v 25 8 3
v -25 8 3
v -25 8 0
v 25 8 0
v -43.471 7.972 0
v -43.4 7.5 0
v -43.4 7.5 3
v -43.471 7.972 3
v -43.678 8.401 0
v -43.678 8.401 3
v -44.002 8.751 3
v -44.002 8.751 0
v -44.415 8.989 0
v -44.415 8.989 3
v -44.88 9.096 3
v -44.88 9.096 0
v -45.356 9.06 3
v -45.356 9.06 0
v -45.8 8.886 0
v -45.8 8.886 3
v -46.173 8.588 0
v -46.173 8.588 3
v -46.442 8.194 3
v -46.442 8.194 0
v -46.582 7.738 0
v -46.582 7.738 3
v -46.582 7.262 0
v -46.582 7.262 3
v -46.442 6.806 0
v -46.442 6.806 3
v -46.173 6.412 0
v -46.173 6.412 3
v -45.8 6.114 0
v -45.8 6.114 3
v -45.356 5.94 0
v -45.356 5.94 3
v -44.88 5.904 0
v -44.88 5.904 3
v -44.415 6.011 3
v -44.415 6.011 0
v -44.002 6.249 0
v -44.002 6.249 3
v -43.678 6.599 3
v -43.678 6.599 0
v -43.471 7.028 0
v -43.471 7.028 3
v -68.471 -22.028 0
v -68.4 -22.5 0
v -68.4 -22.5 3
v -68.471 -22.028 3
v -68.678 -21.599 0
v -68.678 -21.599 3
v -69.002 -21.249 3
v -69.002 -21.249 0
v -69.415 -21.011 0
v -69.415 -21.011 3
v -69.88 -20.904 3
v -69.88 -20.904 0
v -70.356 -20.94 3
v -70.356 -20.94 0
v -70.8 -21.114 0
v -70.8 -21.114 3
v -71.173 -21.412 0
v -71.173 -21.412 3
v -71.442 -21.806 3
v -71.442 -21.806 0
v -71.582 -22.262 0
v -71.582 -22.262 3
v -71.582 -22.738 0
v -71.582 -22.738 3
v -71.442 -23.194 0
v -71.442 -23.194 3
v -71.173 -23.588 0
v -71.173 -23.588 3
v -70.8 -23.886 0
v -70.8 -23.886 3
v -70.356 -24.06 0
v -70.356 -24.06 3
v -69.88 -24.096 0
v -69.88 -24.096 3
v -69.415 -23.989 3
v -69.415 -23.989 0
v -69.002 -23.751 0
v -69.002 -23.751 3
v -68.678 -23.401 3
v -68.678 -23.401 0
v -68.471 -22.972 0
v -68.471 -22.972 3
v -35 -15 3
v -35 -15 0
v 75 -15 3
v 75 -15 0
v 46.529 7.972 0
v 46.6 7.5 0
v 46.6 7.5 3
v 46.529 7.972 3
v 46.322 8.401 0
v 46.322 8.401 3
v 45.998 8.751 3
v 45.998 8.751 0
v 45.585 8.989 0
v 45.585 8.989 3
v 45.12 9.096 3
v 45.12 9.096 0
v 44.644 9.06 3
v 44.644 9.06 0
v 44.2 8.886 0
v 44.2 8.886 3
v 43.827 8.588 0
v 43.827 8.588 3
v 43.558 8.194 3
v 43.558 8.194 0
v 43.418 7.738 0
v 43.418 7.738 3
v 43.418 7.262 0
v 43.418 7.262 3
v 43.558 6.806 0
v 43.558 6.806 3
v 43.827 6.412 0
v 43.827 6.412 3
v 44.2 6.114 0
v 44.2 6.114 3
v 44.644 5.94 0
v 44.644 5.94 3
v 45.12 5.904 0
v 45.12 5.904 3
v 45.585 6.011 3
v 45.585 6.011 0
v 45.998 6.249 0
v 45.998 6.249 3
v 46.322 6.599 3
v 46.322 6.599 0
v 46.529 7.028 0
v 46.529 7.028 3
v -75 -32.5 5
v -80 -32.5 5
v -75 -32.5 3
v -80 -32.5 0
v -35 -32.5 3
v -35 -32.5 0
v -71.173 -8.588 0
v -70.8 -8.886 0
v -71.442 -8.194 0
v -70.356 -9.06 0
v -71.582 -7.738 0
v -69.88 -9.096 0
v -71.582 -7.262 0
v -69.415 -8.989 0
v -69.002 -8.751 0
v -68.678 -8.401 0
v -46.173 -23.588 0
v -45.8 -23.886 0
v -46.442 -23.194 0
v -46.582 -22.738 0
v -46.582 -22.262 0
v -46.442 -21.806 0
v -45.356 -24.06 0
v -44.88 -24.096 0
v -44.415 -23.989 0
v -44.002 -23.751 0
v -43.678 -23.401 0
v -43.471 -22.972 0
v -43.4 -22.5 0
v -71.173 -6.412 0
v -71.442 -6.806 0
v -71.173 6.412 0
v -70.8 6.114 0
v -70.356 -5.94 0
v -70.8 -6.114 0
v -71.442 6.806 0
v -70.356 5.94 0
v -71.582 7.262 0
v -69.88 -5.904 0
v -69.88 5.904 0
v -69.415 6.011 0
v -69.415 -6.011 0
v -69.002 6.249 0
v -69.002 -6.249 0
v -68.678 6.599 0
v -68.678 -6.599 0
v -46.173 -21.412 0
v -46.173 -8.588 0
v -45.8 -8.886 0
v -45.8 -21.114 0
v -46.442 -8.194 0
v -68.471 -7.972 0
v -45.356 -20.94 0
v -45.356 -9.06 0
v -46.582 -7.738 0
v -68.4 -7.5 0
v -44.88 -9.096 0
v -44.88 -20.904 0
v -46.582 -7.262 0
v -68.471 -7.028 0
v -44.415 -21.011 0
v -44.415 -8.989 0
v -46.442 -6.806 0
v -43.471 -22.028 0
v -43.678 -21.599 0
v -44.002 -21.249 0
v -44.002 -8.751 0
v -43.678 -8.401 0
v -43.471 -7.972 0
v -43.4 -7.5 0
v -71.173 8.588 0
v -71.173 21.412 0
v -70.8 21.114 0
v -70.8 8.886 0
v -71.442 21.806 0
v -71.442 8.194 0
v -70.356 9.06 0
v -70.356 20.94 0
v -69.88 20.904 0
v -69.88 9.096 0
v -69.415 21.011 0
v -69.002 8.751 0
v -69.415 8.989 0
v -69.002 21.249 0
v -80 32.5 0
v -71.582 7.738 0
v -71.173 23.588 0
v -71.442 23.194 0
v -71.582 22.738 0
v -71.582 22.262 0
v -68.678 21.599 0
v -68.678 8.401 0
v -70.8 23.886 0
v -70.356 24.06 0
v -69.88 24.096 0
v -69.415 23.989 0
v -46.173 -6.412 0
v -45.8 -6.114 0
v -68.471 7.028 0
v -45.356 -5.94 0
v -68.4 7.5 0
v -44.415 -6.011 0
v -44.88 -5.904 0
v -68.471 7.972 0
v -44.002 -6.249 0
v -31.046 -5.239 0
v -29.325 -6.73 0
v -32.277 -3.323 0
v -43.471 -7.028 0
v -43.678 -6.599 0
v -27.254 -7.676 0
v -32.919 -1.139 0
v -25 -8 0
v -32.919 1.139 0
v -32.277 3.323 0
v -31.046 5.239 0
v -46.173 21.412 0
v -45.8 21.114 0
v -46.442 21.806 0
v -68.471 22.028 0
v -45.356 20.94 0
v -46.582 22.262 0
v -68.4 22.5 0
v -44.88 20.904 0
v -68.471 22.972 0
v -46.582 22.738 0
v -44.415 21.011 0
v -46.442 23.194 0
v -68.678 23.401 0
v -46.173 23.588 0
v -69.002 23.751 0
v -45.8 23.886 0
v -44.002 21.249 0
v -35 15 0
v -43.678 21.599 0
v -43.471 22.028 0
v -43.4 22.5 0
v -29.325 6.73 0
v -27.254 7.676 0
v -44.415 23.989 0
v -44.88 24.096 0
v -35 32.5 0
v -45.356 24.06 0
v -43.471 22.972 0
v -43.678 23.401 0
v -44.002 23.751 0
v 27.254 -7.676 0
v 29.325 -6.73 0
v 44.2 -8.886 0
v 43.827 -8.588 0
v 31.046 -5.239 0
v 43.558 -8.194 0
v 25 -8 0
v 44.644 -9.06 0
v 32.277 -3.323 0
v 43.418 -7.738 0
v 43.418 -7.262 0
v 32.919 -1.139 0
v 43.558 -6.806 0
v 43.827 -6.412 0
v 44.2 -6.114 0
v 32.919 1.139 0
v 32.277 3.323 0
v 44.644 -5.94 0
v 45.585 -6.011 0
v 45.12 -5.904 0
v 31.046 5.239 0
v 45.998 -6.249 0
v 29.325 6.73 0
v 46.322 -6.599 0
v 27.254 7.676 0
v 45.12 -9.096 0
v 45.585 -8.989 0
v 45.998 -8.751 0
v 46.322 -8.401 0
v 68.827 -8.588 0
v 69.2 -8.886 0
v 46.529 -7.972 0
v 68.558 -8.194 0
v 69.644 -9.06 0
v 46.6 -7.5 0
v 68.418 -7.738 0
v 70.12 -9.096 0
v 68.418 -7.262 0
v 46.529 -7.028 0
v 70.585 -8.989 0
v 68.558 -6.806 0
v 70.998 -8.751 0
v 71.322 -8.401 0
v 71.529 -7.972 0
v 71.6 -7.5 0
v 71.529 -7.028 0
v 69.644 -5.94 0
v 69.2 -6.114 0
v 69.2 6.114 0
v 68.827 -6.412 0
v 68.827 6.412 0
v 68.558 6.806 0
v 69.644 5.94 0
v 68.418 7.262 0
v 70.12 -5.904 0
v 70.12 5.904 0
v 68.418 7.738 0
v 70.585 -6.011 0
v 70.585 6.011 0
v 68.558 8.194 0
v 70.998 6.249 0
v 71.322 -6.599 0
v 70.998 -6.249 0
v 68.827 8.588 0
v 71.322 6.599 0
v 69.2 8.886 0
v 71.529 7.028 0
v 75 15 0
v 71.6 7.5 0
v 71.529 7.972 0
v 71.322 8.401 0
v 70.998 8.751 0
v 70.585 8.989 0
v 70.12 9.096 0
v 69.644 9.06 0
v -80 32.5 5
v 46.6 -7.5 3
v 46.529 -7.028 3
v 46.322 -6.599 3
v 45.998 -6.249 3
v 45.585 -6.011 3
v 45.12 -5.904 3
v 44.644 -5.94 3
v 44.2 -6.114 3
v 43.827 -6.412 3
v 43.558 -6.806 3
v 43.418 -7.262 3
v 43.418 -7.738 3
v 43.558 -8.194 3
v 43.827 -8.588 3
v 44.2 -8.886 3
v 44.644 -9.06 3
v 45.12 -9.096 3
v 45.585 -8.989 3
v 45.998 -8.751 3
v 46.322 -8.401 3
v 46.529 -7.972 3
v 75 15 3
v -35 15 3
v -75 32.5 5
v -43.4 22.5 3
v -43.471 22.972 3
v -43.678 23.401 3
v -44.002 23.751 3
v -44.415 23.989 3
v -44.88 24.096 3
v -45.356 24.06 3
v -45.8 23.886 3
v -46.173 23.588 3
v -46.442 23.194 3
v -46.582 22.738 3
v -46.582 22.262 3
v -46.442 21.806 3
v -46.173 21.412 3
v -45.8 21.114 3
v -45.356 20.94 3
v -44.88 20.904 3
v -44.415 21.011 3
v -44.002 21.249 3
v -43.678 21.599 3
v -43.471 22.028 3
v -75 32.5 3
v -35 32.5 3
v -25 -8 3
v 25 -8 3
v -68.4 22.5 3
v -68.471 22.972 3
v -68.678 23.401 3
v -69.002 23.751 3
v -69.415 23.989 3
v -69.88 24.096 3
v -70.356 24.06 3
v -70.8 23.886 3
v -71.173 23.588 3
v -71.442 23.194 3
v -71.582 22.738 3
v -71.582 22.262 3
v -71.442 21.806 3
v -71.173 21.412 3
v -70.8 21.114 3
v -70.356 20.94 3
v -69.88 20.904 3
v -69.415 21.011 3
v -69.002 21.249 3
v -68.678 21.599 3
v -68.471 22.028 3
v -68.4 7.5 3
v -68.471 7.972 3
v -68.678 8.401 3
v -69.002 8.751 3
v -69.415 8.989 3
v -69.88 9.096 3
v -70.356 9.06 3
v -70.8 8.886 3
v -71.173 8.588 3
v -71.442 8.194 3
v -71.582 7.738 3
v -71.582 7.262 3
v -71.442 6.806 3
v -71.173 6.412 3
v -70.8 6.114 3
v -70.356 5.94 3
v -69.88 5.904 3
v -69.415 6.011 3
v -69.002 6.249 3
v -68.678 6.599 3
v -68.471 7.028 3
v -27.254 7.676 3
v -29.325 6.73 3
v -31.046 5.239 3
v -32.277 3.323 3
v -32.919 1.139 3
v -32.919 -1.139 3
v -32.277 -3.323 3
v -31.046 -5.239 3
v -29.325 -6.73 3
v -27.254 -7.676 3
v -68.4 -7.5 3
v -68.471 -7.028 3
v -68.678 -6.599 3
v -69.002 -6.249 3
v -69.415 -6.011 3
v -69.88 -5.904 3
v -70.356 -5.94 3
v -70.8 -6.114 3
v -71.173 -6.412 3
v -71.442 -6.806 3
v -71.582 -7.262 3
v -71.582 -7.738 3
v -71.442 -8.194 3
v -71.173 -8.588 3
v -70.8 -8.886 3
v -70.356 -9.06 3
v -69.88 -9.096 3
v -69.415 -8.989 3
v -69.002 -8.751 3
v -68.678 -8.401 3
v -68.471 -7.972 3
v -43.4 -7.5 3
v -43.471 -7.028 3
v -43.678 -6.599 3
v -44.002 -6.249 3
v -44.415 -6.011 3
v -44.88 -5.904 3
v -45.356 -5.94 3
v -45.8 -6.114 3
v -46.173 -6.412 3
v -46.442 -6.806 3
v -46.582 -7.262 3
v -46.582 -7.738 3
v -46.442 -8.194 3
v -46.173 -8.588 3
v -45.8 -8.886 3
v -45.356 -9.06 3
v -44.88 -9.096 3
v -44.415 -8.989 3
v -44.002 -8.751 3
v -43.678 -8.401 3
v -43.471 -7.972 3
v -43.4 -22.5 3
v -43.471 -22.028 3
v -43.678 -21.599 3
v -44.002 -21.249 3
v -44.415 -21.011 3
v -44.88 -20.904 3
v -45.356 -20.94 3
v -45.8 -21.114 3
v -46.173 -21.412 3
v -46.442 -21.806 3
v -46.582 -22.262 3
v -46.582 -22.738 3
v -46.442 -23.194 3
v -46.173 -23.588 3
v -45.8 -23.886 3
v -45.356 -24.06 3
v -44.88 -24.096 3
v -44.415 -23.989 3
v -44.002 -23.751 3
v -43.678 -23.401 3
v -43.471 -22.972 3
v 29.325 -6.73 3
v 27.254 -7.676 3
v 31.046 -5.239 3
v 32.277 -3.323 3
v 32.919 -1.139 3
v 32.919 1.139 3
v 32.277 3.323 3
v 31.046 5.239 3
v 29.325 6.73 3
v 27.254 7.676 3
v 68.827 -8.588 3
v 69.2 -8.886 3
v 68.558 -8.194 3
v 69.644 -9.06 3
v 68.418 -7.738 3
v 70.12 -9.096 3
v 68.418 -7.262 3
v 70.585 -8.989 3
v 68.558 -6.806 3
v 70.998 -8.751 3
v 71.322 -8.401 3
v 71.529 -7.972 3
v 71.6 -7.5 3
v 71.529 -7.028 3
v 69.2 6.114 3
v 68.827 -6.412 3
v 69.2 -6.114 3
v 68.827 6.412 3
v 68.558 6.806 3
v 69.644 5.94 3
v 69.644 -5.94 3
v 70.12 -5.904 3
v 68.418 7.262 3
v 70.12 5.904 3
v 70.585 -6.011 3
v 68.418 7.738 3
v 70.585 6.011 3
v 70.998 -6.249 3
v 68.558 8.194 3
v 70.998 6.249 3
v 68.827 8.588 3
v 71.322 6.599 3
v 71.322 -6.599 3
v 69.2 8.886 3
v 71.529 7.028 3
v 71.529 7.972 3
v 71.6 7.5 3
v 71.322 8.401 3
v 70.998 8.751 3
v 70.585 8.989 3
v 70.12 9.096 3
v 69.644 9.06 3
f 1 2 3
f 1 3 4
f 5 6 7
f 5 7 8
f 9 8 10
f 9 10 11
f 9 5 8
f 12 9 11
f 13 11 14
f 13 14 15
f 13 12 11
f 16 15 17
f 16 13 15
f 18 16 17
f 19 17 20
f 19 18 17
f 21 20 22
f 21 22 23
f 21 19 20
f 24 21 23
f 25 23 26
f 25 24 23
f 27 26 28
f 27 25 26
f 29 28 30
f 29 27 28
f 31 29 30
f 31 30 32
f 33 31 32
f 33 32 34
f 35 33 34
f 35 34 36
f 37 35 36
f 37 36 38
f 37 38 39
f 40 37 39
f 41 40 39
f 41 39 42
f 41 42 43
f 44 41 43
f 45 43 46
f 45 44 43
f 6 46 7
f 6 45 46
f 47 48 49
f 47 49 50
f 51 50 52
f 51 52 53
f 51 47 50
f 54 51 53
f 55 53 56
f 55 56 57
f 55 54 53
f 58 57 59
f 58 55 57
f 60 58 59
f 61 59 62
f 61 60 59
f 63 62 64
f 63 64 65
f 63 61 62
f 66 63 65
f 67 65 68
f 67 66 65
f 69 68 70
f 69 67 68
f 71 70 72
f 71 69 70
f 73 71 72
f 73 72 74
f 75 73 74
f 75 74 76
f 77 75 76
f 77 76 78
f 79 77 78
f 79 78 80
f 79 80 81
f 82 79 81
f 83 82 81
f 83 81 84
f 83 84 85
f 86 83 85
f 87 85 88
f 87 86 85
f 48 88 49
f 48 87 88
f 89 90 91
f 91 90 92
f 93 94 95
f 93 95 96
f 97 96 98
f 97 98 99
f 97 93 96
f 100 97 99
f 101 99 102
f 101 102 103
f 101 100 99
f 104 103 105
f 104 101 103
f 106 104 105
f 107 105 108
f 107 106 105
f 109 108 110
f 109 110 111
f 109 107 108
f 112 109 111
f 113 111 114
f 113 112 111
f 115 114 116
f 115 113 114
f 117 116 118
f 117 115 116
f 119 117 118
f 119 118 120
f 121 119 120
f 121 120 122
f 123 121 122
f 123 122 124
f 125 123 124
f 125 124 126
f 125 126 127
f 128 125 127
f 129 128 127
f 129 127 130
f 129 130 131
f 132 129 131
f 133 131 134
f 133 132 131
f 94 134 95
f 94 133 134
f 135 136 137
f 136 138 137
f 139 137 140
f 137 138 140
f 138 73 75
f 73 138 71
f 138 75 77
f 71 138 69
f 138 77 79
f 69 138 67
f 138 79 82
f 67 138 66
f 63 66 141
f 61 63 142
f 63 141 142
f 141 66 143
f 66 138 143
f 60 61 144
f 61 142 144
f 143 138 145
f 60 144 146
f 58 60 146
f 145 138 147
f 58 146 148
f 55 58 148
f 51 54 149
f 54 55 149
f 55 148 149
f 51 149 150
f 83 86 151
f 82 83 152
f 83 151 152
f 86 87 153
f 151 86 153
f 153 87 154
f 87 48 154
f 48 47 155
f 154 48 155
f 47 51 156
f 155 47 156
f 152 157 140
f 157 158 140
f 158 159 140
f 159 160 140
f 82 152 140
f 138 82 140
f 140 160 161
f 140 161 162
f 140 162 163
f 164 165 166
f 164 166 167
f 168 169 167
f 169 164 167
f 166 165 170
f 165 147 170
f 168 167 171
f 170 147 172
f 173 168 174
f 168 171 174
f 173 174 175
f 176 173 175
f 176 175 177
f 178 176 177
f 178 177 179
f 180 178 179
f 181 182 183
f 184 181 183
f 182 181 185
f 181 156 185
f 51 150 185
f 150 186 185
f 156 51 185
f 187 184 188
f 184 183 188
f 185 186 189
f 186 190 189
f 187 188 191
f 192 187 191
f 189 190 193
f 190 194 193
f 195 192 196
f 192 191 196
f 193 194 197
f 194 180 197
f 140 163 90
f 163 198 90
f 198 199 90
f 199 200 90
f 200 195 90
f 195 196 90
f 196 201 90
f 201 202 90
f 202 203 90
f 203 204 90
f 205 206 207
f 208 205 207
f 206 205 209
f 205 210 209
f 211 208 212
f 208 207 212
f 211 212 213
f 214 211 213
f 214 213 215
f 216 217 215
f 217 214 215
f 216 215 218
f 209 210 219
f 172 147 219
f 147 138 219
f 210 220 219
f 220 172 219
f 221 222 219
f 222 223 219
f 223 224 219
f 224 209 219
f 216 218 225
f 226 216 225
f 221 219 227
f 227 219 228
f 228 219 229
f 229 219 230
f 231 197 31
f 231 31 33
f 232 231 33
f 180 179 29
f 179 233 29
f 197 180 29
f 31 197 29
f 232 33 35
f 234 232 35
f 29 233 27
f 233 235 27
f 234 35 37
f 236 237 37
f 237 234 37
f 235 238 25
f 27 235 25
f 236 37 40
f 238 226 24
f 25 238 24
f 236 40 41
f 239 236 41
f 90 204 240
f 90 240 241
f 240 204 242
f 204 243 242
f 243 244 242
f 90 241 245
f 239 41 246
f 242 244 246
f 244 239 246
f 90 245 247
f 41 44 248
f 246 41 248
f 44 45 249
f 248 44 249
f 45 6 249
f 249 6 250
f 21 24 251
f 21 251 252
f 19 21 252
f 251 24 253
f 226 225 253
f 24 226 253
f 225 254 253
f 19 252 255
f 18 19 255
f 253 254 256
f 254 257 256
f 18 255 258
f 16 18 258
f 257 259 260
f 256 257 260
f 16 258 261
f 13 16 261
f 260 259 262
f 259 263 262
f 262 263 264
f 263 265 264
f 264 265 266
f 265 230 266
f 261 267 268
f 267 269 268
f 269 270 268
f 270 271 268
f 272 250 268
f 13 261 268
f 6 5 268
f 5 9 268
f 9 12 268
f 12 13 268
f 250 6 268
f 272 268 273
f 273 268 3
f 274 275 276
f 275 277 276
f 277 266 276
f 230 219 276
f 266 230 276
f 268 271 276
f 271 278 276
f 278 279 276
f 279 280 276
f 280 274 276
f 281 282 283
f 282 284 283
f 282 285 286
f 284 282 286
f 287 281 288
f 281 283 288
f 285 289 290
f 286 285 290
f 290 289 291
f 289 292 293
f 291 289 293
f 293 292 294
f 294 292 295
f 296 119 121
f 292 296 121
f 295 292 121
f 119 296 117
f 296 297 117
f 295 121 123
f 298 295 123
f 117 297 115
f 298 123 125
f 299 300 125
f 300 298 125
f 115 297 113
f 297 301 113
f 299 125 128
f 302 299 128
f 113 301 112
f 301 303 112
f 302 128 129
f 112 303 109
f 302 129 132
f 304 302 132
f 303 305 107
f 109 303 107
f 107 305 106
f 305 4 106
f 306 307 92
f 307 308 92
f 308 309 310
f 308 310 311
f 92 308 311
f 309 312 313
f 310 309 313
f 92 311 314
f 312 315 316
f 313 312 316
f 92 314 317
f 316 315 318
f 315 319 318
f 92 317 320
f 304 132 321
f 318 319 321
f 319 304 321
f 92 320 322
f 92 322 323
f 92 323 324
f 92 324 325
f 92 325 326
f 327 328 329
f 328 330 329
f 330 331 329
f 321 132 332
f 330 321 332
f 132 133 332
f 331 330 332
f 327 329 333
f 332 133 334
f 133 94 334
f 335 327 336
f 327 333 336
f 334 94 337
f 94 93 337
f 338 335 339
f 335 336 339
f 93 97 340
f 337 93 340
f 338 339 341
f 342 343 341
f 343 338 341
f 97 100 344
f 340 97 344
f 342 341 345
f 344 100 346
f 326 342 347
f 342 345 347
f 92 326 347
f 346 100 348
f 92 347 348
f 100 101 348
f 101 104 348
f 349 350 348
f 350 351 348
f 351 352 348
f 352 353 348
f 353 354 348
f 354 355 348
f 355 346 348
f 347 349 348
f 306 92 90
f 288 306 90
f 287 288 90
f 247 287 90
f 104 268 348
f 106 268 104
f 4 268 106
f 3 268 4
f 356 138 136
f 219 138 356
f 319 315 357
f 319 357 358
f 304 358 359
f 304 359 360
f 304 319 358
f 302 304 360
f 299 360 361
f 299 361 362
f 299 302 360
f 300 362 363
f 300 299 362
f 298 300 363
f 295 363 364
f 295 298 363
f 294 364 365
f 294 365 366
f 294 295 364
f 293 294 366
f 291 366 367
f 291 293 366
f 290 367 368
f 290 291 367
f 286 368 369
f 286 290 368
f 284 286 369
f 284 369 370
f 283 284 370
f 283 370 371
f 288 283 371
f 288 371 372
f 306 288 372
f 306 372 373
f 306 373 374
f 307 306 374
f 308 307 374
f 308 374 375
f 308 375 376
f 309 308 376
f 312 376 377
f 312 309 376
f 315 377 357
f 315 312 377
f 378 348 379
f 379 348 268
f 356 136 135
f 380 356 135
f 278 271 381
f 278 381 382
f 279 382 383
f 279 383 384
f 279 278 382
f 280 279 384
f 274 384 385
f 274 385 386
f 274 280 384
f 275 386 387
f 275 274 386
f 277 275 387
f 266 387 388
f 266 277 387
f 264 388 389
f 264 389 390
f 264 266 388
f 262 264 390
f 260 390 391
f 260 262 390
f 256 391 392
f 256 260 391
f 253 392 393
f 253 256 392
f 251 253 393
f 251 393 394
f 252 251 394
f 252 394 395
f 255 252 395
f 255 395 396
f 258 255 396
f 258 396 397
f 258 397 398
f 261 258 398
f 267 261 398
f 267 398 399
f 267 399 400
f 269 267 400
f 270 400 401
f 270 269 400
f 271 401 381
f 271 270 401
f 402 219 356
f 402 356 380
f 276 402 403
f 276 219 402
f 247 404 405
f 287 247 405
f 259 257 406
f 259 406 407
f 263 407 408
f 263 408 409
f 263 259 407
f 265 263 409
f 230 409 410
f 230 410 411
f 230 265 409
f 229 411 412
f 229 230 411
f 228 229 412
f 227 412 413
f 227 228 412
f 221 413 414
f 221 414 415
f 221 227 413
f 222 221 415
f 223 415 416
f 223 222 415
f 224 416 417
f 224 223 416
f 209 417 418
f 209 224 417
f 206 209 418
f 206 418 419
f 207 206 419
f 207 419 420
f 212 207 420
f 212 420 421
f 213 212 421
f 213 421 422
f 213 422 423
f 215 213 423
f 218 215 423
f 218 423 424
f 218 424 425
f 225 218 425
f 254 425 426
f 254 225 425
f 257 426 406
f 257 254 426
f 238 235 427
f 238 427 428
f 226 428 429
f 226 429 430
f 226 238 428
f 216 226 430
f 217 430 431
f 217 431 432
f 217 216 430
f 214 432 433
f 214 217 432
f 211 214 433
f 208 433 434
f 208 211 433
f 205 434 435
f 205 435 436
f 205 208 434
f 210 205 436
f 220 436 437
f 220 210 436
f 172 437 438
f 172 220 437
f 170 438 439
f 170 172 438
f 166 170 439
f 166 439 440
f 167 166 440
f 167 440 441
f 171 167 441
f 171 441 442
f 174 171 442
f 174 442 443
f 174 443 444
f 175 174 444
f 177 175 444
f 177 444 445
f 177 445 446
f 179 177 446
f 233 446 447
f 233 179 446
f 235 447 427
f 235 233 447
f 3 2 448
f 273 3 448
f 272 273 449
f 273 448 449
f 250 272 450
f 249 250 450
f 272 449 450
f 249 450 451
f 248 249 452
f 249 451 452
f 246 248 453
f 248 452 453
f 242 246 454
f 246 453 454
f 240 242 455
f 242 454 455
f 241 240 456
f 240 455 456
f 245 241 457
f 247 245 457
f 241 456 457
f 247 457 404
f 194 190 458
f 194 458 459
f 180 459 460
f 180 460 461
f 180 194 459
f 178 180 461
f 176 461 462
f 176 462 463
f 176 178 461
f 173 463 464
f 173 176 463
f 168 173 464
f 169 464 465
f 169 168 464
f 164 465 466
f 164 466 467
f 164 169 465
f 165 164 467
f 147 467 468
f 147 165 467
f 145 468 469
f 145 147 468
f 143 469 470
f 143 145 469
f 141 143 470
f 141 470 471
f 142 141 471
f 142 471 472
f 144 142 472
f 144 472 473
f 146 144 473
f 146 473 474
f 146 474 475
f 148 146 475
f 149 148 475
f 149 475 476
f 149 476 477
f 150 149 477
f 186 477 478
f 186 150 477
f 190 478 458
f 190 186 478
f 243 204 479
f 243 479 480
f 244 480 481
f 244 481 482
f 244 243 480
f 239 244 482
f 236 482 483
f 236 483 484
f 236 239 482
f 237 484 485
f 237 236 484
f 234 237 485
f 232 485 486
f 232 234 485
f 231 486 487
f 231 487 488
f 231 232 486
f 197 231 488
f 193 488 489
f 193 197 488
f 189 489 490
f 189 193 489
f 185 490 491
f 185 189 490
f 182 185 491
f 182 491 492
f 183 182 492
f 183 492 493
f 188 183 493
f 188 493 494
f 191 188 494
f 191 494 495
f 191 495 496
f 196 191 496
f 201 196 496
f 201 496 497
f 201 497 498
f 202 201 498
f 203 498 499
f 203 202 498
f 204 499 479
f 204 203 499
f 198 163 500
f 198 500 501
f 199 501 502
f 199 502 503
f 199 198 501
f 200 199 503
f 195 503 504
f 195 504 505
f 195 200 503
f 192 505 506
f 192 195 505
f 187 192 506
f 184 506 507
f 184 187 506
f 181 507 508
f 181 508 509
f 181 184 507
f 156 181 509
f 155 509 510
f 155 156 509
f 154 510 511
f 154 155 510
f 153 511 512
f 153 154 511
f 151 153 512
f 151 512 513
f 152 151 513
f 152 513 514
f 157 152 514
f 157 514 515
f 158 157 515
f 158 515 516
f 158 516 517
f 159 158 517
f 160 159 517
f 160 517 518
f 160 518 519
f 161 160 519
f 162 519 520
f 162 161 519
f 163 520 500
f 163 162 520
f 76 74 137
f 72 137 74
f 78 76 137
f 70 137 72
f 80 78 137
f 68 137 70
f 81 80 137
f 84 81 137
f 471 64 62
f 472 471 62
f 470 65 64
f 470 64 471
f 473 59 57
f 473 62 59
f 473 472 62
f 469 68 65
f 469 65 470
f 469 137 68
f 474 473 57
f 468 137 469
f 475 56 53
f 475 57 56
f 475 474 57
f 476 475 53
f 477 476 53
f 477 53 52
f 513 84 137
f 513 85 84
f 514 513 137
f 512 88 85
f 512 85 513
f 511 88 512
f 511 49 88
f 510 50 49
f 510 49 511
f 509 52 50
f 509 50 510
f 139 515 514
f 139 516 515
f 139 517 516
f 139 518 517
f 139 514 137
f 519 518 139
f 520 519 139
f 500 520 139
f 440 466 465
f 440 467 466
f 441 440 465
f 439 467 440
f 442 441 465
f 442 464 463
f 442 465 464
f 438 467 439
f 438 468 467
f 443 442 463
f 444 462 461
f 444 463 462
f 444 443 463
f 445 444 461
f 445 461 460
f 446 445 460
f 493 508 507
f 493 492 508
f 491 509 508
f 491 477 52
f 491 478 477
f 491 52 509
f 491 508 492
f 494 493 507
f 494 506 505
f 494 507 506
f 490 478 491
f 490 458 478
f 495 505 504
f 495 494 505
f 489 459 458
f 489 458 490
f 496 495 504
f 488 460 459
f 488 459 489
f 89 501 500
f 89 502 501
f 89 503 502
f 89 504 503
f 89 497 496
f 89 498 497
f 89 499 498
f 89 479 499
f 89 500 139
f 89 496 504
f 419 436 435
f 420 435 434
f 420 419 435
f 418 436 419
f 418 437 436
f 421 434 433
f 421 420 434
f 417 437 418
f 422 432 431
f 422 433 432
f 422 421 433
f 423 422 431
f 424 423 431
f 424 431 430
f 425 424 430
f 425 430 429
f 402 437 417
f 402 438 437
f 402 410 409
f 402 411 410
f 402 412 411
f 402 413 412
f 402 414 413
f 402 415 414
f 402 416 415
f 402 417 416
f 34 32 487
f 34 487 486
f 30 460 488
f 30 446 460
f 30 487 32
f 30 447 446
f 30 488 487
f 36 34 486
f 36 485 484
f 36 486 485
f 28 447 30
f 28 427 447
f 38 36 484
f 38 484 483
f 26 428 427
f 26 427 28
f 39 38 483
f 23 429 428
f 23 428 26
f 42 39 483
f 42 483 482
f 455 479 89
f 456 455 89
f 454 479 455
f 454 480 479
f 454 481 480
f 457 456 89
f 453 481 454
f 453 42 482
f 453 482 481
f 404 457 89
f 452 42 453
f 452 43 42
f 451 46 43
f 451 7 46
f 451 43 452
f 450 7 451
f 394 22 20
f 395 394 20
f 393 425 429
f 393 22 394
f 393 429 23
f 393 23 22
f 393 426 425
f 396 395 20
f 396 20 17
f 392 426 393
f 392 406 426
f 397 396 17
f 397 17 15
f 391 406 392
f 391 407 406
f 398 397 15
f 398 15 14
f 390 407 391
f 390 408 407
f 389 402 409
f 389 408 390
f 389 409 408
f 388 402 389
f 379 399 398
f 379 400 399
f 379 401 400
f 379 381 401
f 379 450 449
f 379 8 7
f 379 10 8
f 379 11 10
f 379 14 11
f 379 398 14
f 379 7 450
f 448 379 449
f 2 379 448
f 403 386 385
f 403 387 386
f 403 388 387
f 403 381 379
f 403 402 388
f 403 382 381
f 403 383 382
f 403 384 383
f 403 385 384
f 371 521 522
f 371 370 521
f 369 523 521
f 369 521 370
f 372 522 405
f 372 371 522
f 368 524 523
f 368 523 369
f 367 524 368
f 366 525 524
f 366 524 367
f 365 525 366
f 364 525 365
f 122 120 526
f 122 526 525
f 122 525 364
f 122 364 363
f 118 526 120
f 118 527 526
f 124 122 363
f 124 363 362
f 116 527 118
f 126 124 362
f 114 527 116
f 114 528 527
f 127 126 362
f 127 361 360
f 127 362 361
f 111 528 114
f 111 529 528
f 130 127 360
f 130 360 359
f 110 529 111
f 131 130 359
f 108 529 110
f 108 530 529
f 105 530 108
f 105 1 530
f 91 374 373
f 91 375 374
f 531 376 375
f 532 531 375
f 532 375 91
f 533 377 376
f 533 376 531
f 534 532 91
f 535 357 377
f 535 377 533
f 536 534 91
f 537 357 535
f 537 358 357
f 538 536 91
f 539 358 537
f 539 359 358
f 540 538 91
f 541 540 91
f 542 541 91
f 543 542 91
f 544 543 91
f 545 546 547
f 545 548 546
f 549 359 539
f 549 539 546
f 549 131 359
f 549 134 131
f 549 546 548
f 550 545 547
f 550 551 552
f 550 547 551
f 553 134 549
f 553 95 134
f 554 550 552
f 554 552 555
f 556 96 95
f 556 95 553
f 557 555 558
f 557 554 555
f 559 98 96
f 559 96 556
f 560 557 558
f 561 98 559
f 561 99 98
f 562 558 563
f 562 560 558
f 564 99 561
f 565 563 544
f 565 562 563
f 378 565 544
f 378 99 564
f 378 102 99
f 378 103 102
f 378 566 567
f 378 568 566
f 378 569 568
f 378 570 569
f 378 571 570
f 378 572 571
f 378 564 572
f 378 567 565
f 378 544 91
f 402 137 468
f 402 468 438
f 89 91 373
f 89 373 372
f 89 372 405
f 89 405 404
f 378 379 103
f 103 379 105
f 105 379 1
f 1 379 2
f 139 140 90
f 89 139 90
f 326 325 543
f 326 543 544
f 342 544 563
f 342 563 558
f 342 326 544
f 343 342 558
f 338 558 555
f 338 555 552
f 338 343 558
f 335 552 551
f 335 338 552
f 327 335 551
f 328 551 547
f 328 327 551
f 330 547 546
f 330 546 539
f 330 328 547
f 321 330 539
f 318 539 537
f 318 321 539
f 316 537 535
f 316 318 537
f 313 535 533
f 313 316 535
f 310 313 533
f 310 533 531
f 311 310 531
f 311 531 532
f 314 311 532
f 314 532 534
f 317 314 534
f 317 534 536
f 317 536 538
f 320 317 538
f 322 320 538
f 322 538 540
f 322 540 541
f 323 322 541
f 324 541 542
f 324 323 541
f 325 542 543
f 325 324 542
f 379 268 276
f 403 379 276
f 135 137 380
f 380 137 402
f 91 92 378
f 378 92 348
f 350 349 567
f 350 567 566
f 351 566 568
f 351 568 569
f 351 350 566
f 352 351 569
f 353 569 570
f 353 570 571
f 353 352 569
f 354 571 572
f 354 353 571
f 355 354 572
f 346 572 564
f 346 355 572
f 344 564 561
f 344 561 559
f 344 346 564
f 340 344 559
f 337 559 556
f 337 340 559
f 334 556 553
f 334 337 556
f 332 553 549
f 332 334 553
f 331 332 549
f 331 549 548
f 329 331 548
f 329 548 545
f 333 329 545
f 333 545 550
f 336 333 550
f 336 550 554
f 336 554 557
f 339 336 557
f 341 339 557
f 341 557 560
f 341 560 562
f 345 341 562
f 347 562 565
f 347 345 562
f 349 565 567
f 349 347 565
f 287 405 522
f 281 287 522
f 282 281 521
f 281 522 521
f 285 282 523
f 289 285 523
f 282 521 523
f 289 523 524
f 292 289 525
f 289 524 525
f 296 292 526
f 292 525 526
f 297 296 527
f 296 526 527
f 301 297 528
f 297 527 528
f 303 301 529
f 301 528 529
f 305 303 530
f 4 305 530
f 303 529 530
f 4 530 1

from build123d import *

# Parameters (mm, degrees)
SKETCH_R     = 1.6
PAD_DEPTH    = 3
SKETCH001_W  = 5
SKETCH001_H  = 65
PAD001_DEPTH = 2
POCKET_DEPTH = 5


with BuildPart() as part:
    # Sketch → Pad (new body)
    with BuildSketch(Plane.XY):
        Polygon((-80, 32.5), (-80, -32.5), (-35, -32.5), (-35, -15), (75, -15), (75, 15), (-35, 15), (-35, 32.5), align=None)
        with Locations((-70, 22.5)):
            Circle(SKETCH_R, mode=Mode.SUBTRACT)
        with Locations((-45, 22.5)):
            Circle(SKETCH_R, mode=Mode.SUBTRACT)
        with Locations((-70, 7.5)):
            Circle(SKETCH_R, mode=Mode.SUBTRACT)
        with Locations((-45, 7.5)):
            Circle(SKETCH_R, mode=Mode.SUBTRACT)
        with Locations((-70, -7.5)):
            Circle(SKETCH_R, mode=Mode.SUBTRACT)
        with Locations((-45, -7.5)):
            Circle(SKETCH_R, mode=Mode.SUBTRACT)
        with Locations((-70, -22.5)):
            Circle(SKETCH_R, mode=Mode.SUBTRACT)
        with Locations((-45, -22.5)):
            Circle(SKETCH_R, mode=Mode.SUBTRACT)
        with Locations((45, 7.5)):
            Circle(SKETCH_R, mode=Mode.SUBTRACT)
        with Locations((45, -7.5)):
            Circle(SKETCH_R, mode=Mode.SUBTRACT)
        with Locations((70, 7.5)):
            Circle(SKETCH_R, mode=Mode.SUBTRACT)
        with Locations((70, -7.5)):
            Circle(SKETCH_R, mode=Mode.SUBTRACT)
    extrude(amount=PAD_DEPTH)

    # Sketch001 → Pad001 (new body)
    with BuildSketch(Plane.XY.offset(3)):
        with Locations((-77.5, 0)):
            Rectangle(SKETCH001_W, SKETCH001_H)
    extrude(amount=PAD001_DEPTH)

    # Sketch002 → Pocket (cut)
    with BuildSketch(Plane.XY.offset(3)):
        with BuildLine():
            ThreePointArc((-25, 8), (-33.000002, 1e-06), (-25.000002, -8))
            Line((-25.000002, -8), (25.000002, -8))
            ThreePointArc((25.000002, -8), (33.000002, 1e-06), (25, 8))
            Line((-25, 8), (25, 8))
        make_face()
    extrude(amount=-POCKET_DEPTH, mode=Mode.SUBTRACT)


solid = part.part
